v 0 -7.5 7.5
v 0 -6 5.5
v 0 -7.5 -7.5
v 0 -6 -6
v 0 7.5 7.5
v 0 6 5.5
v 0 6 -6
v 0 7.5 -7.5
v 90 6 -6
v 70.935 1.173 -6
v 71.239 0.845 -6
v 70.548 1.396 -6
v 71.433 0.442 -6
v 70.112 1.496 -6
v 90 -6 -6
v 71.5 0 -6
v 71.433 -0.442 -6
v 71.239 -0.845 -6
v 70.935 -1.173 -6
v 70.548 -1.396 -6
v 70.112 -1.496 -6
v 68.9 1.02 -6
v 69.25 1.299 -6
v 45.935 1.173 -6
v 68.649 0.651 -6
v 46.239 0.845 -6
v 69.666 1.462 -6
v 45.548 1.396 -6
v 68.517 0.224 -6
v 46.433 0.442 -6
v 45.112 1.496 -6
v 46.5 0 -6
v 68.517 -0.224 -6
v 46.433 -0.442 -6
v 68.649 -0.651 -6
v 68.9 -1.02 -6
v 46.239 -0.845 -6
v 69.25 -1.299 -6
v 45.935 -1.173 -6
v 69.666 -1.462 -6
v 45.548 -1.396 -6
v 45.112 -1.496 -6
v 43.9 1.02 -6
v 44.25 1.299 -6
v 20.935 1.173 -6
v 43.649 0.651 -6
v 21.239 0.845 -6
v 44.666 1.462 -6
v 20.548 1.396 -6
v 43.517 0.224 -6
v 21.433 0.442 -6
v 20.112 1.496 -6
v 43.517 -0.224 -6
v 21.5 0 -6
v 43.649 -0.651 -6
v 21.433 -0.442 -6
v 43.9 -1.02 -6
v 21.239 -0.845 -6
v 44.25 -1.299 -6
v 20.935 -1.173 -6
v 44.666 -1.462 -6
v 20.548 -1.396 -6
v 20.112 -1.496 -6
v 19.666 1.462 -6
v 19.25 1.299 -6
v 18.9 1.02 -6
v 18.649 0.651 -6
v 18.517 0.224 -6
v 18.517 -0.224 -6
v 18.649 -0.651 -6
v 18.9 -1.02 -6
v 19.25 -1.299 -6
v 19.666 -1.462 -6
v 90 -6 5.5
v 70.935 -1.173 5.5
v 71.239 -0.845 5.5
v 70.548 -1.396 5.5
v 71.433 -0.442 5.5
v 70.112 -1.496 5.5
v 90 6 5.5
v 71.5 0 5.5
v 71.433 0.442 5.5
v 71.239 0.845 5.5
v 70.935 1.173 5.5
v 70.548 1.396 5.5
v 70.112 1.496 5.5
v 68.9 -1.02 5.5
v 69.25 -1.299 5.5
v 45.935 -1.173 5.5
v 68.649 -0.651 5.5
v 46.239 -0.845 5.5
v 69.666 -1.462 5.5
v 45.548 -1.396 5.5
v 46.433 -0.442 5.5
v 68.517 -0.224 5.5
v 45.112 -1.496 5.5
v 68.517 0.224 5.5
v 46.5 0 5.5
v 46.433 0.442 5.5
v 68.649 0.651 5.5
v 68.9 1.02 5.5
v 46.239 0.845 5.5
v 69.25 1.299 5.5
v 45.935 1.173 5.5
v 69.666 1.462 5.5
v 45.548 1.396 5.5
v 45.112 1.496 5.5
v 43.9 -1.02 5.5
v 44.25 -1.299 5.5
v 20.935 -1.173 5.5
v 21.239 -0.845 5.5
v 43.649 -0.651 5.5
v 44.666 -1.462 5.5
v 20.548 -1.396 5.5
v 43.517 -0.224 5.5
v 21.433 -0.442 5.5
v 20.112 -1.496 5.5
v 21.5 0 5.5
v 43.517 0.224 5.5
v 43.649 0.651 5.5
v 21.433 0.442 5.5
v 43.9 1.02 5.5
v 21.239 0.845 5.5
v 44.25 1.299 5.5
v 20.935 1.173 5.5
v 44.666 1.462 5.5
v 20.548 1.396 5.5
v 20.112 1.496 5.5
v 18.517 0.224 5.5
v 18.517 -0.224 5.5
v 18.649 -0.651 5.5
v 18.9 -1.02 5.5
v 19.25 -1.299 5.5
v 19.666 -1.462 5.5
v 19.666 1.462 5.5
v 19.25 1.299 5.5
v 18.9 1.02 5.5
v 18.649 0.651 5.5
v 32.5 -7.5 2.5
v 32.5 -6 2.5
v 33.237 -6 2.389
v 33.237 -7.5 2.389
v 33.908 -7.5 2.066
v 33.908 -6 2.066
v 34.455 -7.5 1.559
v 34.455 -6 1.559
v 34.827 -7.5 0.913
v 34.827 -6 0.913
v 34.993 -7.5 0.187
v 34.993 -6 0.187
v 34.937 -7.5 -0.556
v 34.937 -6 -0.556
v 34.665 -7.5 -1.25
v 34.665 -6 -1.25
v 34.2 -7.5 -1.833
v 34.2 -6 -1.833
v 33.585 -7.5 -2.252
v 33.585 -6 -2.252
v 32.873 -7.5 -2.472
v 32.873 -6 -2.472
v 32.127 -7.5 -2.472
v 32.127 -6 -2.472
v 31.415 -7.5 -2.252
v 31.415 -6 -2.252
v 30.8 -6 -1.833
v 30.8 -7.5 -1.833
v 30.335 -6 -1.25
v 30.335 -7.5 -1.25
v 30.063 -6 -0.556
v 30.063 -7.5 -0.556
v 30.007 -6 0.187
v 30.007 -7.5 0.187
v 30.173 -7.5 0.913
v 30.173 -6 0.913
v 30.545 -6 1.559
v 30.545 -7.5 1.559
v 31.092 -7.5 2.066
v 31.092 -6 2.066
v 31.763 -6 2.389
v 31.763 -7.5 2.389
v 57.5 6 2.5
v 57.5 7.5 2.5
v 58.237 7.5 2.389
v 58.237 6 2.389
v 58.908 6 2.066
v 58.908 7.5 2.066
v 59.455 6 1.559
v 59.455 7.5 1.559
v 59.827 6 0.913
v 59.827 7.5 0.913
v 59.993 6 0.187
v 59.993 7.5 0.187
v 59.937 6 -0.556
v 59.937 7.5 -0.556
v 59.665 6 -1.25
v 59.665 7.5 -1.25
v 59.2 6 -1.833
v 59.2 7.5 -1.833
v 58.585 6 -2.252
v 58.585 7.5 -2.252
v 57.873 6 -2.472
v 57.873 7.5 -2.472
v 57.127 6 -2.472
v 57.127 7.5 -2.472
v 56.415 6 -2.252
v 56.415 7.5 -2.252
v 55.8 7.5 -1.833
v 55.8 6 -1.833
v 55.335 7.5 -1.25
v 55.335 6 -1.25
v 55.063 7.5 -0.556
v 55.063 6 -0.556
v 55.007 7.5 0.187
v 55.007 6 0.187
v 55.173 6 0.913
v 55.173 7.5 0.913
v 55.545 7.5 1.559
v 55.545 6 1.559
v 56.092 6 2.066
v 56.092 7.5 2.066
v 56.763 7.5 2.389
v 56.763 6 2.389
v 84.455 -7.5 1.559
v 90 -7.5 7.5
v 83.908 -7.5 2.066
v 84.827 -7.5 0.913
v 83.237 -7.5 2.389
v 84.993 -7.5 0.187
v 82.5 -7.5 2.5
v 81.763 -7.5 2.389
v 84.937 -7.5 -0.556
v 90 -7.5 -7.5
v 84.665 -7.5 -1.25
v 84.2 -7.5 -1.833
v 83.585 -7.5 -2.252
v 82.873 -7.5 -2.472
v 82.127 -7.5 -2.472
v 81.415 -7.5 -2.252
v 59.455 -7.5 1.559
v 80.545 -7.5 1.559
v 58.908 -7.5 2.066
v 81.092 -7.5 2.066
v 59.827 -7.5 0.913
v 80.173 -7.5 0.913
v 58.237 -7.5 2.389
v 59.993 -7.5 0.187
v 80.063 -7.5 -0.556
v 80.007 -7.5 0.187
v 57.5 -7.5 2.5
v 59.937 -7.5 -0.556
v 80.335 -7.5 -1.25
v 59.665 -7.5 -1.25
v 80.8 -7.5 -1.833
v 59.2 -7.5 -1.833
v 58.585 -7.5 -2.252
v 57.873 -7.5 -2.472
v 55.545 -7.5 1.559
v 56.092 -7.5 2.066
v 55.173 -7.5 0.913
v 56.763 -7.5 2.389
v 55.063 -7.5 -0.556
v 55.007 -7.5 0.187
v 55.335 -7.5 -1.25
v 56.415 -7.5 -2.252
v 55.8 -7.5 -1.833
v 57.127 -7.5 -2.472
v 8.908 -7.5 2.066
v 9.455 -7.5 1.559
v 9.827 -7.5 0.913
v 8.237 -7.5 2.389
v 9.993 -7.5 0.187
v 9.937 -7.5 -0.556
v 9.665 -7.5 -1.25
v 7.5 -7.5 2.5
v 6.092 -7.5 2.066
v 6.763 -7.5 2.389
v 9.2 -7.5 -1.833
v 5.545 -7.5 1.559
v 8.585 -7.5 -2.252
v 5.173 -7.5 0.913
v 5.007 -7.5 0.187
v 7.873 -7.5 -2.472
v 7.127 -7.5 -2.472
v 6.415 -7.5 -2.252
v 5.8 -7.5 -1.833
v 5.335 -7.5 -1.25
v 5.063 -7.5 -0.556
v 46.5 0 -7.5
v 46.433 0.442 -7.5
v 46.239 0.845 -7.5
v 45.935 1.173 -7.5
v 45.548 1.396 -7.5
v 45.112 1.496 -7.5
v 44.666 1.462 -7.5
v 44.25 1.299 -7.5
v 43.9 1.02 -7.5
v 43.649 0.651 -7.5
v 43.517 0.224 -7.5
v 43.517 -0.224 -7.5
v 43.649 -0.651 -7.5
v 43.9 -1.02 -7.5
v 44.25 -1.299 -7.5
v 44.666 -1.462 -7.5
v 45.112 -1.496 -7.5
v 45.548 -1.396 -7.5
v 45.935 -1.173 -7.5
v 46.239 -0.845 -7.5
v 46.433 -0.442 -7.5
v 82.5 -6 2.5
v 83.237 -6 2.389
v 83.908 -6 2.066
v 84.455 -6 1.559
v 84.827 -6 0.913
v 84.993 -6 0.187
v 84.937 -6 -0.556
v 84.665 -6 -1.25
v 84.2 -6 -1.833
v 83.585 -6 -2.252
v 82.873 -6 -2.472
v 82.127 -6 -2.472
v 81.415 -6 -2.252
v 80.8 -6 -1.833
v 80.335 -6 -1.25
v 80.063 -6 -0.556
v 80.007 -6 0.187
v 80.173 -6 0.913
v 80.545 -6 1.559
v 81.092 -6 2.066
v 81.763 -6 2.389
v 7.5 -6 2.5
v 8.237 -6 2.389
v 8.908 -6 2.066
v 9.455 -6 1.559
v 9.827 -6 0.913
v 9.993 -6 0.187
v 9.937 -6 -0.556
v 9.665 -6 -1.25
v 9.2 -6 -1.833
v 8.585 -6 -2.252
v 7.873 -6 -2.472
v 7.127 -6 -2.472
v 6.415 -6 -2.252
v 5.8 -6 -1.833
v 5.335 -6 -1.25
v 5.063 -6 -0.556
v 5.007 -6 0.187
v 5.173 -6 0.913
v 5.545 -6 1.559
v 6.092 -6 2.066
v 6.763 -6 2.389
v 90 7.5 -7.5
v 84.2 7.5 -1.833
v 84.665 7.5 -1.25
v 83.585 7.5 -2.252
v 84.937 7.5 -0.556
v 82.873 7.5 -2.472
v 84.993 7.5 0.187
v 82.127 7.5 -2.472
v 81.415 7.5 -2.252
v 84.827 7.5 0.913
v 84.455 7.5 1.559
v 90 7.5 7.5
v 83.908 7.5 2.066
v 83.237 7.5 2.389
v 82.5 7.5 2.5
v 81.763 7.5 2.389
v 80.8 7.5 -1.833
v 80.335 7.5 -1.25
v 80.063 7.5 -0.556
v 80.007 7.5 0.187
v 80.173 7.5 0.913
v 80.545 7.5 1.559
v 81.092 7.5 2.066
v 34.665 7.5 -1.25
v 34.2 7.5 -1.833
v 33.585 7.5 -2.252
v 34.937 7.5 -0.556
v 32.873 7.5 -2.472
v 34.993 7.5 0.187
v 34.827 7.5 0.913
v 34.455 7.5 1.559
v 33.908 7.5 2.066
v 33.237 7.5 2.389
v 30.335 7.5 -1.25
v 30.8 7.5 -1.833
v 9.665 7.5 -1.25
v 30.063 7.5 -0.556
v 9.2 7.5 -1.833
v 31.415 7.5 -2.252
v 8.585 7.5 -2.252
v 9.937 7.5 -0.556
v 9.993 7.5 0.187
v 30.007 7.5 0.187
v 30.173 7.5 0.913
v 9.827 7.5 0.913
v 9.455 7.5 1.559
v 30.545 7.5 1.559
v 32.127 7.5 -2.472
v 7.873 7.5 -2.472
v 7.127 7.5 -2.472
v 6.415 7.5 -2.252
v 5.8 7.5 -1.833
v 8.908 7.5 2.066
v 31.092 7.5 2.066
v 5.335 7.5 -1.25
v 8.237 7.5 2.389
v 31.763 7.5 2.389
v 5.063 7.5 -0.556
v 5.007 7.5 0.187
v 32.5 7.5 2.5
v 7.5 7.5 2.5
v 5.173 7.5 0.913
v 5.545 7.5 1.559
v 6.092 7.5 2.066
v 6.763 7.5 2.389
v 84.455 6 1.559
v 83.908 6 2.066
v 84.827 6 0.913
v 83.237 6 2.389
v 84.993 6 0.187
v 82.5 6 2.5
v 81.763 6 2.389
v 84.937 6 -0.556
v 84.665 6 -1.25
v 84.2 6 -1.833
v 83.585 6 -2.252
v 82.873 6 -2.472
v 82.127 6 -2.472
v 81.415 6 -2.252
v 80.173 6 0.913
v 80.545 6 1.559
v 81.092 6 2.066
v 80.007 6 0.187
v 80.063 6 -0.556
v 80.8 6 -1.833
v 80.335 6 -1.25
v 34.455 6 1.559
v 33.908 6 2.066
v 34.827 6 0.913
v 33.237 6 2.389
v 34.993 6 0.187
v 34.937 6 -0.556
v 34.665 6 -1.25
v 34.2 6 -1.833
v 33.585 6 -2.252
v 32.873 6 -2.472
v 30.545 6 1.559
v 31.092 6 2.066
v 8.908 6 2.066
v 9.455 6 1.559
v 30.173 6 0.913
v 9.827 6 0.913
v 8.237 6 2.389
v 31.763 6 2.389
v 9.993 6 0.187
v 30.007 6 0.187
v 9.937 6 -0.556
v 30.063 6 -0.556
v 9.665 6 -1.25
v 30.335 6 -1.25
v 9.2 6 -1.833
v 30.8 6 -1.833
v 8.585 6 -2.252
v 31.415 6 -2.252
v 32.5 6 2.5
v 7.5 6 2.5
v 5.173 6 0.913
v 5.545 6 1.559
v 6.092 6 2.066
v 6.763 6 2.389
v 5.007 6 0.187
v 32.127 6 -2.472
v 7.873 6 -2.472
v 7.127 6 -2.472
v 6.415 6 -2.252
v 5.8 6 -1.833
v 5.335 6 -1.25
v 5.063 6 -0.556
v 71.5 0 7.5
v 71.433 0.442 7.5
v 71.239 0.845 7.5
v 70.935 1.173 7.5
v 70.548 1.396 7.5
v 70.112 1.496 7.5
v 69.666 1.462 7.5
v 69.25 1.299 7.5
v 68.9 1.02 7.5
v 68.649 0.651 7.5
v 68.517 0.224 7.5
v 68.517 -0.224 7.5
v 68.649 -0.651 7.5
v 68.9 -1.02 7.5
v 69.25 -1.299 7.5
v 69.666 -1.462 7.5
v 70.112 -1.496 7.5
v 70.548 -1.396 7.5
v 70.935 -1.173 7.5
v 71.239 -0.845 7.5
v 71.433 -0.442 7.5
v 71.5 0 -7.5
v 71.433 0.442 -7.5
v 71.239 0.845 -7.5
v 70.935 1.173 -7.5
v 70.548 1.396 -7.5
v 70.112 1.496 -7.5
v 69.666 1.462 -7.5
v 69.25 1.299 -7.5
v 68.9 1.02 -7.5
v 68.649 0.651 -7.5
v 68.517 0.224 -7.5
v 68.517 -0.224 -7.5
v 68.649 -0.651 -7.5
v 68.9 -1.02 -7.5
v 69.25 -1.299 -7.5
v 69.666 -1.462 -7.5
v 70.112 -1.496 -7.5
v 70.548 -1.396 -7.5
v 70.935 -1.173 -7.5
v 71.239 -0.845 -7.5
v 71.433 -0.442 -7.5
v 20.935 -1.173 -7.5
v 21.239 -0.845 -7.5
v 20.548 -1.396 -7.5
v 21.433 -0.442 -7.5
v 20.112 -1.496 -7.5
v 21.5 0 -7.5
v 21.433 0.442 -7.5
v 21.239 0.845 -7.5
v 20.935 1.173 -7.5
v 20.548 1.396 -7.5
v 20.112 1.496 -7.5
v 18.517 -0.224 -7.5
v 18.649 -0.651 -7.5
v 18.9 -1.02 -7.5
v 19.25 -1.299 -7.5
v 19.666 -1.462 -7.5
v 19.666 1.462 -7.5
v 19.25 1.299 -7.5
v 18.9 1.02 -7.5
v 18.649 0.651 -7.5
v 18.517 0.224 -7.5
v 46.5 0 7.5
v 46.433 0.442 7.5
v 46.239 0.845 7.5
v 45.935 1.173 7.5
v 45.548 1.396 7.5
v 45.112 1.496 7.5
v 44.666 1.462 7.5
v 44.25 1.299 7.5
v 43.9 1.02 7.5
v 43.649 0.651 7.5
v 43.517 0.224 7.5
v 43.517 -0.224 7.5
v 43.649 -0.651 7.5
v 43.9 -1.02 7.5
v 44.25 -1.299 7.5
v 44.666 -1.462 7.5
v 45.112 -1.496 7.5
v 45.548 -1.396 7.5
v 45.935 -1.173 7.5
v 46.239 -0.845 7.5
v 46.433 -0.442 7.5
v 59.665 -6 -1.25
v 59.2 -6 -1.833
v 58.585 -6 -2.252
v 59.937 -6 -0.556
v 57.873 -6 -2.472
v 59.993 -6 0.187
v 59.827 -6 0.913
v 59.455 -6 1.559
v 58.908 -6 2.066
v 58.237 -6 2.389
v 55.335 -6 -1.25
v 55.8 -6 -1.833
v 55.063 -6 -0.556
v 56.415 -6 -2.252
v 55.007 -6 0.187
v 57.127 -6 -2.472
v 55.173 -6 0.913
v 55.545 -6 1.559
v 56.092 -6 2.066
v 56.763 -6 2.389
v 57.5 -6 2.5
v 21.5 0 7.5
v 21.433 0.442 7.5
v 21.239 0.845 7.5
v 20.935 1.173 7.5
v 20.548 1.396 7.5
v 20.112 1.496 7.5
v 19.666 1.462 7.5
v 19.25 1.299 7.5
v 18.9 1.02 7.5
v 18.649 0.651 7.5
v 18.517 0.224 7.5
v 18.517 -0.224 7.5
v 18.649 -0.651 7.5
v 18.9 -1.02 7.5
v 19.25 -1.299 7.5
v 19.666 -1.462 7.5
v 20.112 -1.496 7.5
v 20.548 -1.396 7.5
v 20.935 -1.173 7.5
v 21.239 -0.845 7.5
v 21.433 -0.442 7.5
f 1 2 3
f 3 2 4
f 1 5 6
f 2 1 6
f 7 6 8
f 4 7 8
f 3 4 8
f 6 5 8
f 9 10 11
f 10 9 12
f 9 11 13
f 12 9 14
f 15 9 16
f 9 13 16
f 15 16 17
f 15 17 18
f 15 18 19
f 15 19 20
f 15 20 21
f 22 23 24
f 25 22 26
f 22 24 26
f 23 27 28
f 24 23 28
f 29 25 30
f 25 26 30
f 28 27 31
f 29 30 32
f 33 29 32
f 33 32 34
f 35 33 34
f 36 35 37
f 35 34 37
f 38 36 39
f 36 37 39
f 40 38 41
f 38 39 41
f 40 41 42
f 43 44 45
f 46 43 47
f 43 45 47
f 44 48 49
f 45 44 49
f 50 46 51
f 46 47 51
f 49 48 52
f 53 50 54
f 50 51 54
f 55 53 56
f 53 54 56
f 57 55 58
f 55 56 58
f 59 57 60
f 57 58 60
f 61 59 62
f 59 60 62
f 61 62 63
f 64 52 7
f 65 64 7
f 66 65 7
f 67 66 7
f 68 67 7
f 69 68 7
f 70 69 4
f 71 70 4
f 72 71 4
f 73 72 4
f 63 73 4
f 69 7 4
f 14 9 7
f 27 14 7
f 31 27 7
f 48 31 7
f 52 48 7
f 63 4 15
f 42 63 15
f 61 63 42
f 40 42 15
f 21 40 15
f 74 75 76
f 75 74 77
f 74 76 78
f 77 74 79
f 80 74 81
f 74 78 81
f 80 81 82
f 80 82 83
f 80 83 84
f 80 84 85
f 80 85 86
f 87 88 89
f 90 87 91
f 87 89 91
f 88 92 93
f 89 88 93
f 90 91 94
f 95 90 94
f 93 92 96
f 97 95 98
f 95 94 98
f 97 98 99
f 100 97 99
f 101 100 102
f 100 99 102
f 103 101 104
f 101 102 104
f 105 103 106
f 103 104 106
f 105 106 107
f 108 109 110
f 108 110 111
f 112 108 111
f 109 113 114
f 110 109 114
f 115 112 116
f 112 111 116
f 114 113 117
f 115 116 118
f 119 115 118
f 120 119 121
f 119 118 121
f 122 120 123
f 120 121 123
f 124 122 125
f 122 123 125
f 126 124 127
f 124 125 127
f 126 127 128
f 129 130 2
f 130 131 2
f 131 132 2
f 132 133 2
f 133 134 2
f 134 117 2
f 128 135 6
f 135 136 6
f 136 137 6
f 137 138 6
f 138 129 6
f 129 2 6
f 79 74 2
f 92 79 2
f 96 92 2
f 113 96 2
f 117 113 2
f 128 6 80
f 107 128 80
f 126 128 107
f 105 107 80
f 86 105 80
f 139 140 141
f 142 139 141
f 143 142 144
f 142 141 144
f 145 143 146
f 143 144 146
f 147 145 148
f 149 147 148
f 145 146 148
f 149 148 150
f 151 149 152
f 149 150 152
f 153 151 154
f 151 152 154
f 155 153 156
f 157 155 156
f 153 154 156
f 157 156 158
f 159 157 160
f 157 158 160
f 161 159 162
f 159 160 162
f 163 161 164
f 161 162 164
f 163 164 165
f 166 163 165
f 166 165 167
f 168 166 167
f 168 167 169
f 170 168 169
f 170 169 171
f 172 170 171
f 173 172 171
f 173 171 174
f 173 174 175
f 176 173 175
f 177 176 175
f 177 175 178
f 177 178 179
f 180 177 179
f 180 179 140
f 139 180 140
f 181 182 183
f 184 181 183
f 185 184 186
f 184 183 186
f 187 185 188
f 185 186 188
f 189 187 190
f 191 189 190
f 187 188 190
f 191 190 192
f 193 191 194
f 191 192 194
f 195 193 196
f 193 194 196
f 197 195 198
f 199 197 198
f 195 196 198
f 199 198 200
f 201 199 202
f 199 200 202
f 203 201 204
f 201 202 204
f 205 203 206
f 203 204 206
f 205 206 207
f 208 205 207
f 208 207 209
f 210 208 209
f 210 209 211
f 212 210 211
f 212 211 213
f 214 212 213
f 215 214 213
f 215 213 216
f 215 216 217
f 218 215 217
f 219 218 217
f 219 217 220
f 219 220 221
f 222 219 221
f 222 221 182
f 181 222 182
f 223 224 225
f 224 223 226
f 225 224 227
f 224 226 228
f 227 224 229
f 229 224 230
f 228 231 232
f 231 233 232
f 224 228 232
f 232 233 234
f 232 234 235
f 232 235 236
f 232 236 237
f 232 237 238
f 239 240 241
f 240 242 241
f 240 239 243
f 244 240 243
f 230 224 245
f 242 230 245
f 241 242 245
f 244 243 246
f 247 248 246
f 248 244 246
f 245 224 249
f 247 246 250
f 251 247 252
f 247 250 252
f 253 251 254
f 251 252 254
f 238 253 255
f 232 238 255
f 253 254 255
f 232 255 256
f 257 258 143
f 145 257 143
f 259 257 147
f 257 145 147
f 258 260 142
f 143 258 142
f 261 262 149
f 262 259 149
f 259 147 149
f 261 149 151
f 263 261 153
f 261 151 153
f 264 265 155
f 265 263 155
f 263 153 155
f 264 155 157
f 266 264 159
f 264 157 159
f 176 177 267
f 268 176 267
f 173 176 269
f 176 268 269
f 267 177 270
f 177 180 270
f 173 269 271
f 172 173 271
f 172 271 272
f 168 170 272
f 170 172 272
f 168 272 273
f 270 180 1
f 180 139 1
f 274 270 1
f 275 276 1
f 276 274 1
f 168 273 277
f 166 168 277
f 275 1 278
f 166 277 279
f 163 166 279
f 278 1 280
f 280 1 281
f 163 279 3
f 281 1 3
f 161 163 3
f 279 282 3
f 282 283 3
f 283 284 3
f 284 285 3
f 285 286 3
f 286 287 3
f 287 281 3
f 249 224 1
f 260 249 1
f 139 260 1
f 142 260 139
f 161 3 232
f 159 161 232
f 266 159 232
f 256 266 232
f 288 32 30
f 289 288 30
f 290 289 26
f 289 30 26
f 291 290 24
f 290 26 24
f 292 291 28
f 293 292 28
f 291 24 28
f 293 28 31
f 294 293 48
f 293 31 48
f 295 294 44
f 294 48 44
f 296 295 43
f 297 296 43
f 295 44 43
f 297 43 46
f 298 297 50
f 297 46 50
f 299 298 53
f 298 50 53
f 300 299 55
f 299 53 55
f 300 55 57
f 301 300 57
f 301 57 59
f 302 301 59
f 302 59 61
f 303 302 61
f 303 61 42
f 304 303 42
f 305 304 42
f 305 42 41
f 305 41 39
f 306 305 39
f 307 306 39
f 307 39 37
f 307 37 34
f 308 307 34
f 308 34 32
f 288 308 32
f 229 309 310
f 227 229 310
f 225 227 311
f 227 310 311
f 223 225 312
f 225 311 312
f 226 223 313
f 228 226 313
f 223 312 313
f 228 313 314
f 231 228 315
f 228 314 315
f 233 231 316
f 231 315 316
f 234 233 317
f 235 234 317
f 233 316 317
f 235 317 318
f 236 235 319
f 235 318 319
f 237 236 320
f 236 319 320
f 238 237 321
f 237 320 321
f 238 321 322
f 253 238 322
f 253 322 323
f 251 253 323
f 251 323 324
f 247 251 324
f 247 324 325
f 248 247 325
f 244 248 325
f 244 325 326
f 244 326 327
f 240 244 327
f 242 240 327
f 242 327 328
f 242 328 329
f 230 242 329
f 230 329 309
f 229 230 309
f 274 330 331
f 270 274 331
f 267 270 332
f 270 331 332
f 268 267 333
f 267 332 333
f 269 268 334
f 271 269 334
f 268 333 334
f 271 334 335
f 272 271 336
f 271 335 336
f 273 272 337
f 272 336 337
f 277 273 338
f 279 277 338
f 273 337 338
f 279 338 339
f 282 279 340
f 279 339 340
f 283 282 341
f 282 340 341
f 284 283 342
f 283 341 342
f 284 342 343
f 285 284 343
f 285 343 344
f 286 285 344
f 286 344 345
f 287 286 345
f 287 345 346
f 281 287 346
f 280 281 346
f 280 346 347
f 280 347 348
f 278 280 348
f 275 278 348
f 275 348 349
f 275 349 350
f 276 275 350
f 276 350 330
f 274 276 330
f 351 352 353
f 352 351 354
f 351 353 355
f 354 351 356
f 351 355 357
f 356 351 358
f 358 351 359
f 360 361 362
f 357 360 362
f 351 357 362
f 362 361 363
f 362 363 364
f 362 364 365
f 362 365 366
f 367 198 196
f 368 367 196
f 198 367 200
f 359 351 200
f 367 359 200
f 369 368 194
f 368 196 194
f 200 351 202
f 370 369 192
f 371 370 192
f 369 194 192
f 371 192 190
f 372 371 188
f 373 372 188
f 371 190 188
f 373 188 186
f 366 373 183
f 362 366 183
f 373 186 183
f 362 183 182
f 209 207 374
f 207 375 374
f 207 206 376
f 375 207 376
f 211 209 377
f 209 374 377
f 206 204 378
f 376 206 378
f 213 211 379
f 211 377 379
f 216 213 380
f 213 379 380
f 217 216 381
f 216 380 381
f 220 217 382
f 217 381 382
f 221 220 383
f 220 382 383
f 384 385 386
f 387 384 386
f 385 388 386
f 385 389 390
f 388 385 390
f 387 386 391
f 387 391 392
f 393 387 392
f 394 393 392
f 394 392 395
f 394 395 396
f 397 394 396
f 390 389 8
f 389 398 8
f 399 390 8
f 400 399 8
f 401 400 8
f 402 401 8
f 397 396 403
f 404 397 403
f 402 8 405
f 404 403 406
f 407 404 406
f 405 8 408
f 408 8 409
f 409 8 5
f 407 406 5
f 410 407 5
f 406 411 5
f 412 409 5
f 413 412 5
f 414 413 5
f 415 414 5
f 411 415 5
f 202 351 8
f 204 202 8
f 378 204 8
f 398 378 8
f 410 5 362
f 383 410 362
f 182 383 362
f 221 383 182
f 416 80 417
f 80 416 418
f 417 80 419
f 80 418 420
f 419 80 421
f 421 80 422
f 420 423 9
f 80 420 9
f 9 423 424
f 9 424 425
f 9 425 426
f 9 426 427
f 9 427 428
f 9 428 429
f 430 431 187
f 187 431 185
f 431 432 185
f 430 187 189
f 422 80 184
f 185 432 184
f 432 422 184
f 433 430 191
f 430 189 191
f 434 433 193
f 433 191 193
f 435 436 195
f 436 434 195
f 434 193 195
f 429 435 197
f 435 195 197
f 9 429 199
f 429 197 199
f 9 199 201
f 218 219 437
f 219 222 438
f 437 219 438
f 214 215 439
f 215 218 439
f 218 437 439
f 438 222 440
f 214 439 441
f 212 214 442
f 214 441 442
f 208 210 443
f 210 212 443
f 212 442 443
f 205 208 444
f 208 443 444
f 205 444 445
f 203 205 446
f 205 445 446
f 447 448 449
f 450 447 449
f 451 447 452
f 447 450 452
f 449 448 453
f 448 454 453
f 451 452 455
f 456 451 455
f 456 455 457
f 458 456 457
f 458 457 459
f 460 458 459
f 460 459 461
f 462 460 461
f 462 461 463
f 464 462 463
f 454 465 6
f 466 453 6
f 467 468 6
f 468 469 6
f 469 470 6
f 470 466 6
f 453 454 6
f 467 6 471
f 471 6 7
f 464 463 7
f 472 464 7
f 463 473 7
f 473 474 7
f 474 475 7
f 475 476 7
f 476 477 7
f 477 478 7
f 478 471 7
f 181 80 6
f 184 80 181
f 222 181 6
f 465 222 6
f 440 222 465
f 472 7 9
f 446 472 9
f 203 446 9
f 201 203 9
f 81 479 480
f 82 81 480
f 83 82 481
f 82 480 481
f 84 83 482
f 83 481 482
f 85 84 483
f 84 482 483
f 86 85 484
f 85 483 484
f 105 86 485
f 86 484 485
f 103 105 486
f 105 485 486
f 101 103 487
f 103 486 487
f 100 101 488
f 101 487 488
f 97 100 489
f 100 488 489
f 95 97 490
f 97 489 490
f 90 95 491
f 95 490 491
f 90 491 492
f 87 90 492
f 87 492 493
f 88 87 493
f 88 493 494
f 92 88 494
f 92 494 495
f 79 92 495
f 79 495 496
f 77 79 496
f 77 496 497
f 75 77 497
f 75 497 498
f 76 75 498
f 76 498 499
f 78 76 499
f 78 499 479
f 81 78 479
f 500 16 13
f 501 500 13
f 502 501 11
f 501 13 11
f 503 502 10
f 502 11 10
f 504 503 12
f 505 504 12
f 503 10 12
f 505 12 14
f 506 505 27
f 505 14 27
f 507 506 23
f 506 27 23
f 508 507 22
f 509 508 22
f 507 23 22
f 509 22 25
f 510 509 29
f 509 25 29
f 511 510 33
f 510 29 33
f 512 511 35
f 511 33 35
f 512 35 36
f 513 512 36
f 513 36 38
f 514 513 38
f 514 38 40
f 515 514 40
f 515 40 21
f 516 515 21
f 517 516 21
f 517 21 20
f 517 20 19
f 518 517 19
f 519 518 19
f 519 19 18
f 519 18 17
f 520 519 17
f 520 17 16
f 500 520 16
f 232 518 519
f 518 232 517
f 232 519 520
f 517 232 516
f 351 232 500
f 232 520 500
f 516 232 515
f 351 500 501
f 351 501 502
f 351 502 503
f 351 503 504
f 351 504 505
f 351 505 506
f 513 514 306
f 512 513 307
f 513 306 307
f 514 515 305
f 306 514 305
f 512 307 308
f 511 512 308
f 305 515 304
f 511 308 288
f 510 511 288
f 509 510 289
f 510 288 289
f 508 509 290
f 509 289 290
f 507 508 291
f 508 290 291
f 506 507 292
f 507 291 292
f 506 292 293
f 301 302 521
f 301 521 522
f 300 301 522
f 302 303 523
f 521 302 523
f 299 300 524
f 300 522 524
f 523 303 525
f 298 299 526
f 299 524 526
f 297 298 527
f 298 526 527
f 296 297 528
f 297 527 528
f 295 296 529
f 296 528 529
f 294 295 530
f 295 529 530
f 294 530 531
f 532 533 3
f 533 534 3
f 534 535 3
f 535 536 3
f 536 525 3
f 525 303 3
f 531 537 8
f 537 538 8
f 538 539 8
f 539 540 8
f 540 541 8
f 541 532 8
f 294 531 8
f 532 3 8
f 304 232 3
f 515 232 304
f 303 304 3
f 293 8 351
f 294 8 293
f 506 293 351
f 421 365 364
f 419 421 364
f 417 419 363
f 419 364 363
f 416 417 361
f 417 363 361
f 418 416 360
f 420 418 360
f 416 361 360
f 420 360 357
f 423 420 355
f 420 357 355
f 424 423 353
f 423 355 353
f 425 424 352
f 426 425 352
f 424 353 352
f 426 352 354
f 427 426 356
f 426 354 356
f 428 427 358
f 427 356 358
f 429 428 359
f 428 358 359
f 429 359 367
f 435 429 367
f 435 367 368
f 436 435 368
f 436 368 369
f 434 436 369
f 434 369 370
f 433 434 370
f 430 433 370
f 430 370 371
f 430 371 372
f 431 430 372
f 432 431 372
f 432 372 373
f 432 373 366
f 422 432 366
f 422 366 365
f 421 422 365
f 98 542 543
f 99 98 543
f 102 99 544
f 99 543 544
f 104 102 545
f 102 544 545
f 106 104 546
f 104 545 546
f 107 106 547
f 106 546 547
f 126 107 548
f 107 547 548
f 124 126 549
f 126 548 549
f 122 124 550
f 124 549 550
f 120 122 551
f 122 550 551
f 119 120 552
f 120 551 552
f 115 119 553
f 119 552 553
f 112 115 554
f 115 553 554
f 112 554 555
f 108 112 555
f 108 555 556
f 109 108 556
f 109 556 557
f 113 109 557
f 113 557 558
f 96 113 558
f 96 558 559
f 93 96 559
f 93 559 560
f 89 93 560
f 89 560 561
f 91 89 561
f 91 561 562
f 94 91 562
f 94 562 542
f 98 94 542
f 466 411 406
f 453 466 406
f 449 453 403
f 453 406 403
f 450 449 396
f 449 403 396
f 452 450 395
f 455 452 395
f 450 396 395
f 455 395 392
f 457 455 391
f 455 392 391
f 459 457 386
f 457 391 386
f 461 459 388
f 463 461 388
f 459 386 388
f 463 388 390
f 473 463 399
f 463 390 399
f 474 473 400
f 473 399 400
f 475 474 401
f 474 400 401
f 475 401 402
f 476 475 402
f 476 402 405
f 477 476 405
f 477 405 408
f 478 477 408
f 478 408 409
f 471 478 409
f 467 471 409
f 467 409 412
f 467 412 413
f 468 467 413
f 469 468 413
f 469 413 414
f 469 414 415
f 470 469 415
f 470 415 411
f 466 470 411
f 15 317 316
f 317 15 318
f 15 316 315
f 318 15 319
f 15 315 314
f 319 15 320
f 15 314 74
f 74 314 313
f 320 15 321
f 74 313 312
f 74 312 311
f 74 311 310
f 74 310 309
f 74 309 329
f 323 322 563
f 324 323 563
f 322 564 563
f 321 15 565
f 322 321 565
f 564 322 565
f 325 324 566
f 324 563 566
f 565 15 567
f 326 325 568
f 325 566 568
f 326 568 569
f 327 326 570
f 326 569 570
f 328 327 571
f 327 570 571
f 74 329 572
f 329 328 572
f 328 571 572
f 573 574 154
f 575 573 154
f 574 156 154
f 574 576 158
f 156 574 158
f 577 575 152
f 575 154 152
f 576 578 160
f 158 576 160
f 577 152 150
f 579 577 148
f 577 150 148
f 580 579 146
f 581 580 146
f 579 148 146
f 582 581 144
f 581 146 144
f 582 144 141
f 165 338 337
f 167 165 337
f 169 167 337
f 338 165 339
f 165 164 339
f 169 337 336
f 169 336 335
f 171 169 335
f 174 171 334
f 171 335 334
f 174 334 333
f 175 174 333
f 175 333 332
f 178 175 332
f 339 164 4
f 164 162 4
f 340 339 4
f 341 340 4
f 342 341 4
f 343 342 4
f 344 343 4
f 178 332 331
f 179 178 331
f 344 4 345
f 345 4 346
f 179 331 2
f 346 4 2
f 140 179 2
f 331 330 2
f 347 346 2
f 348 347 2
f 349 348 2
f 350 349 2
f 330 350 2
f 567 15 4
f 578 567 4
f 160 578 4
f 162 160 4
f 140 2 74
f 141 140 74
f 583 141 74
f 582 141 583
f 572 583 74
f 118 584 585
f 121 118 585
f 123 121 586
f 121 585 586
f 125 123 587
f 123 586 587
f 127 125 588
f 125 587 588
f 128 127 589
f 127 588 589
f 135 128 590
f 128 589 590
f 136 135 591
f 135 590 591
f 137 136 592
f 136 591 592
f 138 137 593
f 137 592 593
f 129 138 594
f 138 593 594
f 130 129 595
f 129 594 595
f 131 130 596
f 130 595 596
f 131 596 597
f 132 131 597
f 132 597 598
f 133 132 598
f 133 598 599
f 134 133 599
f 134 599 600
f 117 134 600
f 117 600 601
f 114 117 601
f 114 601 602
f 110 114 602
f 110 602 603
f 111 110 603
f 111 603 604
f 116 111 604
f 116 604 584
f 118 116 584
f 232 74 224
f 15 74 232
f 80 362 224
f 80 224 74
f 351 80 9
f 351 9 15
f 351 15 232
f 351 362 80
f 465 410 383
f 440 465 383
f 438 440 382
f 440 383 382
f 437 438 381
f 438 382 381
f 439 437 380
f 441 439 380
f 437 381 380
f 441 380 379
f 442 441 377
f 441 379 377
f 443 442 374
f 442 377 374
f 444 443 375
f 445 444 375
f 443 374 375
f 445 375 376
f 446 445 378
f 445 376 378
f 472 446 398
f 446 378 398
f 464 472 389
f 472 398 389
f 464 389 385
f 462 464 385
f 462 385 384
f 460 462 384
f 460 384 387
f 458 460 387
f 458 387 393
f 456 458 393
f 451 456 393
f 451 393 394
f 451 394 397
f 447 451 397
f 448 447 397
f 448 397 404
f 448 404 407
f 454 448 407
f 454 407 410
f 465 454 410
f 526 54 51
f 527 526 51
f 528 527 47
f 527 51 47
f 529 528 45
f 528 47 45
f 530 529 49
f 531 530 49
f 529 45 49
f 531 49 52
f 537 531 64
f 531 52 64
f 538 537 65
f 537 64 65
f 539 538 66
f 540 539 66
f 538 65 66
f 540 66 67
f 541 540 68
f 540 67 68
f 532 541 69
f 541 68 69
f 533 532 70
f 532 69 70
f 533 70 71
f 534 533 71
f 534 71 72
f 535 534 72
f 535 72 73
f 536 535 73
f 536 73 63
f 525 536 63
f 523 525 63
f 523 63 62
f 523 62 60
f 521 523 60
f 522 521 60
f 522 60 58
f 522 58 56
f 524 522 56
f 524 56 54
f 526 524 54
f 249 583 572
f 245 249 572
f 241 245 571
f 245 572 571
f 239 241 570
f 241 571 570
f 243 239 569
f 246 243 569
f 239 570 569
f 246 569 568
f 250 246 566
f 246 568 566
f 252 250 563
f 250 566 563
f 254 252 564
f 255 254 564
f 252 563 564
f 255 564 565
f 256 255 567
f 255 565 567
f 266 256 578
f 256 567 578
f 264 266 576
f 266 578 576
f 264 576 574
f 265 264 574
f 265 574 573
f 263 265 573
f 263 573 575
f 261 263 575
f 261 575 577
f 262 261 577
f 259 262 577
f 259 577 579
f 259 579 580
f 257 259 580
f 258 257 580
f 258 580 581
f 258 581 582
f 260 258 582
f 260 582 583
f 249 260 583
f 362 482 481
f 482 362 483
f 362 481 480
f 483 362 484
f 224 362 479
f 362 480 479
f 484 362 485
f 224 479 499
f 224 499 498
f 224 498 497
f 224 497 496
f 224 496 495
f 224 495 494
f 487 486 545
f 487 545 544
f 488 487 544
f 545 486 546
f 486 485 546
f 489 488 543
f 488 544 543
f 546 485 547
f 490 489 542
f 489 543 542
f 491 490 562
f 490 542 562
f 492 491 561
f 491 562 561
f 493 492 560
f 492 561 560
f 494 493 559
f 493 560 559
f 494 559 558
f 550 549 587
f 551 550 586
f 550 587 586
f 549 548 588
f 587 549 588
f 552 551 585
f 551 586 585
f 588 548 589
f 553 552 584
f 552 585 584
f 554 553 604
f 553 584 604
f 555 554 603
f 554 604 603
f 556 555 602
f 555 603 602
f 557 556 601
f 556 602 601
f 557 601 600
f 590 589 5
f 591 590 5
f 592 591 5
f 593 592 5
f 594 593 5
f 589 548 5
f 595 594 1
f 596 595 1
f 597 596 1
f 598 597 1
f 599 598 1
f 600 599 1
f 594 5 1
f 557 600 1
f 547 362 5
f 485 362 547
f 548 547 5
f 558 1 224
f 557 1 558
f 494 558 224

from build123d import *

# Parameters (mm, degrees)
MEMBER_15_15_1_5_1_DEPTH = 90
SKETCH_3_R               = 2.5
CUT_EXTRUDE_1_DEPTH      = 92.549167118
SKETCH_4_R               = 1.5
CUT_EXTRUDE_2_DEPTH      = 92.549167118


with BuildPart() as part:
    # Sketch1 → Member 15 _15_ 1.5_1 (new body)
    with BuildSketch(Plane(origin=(0, 0, 0), x_dir=(0, 0, -1), z_dir=(1, 0, 0))):
        Polygon((-6, -7.5), (6, -7.5), (7.5, -7.5), (7.5, -6), (7.5, 6), (7.5, 7.5), (6, 7.5), (-6, 7.5), (-7.5, 7.5), (-7.5, 6), (-7.5, -6), (-7.5, -7.5), align=None)
        Polygon((-4, -6), (4, -6), (6, -6), (6, -3.5), (6, 3.5), (6, 6), (3.5, 6), (-3.5, 6), (-5.5, 6), (-5.5, 3.5), (-5.5, -3.5), (-5.5, -6), align=None, mode=Mode.SUBTRACT)
    extrude(amount=MEMBER_15_15_1_5_1_DEPTH)

    # 草图3 → 切除-拉伸1 (cut, through all)
    with BuildSketch(Plane(origin=(0, 7.5, 0), x_dir=(1, 0, 0), z_dir=(0, 1, 0))):
        with Locations(Location((7.5, 0, 0), (0, 0, 270))):
            Circle(SKETCH_3_R)
        with Locations(Location((32.5, 0, 0), (0, 0, 270))):
            Circle(SKETCH_3_R)
        with Locations(Location((57.5, 0, 0), (0, 0, 270))):
            Circle(SKETCH_3_R)
        with Locations(Location((82.5, 0, 0), (0, 0, 270))):
            Circle(SKETCH_3_R)
    extrude(amount=-CUT_EXTRUDE_1_DEPTH, mode=Mode.SUBTRACT)

    # 草图4 → 切除-拉伸2 (cut, through all)
    with BuildSketch(Plane.XY.offset(7.5)):
        with Locations((45, 0)):
            Circle(SKETCH_4_R)
        with Locations((20, 0)):
            Circle(SKETCH_4_R)
        with Locations((70, 0)):
            Circle(SKETCH_4_R)
    extrude(amount=-CUT_EXTRUDE_2_DEPTH, mode=Mode.SUBTRACT)


solid = part.part
